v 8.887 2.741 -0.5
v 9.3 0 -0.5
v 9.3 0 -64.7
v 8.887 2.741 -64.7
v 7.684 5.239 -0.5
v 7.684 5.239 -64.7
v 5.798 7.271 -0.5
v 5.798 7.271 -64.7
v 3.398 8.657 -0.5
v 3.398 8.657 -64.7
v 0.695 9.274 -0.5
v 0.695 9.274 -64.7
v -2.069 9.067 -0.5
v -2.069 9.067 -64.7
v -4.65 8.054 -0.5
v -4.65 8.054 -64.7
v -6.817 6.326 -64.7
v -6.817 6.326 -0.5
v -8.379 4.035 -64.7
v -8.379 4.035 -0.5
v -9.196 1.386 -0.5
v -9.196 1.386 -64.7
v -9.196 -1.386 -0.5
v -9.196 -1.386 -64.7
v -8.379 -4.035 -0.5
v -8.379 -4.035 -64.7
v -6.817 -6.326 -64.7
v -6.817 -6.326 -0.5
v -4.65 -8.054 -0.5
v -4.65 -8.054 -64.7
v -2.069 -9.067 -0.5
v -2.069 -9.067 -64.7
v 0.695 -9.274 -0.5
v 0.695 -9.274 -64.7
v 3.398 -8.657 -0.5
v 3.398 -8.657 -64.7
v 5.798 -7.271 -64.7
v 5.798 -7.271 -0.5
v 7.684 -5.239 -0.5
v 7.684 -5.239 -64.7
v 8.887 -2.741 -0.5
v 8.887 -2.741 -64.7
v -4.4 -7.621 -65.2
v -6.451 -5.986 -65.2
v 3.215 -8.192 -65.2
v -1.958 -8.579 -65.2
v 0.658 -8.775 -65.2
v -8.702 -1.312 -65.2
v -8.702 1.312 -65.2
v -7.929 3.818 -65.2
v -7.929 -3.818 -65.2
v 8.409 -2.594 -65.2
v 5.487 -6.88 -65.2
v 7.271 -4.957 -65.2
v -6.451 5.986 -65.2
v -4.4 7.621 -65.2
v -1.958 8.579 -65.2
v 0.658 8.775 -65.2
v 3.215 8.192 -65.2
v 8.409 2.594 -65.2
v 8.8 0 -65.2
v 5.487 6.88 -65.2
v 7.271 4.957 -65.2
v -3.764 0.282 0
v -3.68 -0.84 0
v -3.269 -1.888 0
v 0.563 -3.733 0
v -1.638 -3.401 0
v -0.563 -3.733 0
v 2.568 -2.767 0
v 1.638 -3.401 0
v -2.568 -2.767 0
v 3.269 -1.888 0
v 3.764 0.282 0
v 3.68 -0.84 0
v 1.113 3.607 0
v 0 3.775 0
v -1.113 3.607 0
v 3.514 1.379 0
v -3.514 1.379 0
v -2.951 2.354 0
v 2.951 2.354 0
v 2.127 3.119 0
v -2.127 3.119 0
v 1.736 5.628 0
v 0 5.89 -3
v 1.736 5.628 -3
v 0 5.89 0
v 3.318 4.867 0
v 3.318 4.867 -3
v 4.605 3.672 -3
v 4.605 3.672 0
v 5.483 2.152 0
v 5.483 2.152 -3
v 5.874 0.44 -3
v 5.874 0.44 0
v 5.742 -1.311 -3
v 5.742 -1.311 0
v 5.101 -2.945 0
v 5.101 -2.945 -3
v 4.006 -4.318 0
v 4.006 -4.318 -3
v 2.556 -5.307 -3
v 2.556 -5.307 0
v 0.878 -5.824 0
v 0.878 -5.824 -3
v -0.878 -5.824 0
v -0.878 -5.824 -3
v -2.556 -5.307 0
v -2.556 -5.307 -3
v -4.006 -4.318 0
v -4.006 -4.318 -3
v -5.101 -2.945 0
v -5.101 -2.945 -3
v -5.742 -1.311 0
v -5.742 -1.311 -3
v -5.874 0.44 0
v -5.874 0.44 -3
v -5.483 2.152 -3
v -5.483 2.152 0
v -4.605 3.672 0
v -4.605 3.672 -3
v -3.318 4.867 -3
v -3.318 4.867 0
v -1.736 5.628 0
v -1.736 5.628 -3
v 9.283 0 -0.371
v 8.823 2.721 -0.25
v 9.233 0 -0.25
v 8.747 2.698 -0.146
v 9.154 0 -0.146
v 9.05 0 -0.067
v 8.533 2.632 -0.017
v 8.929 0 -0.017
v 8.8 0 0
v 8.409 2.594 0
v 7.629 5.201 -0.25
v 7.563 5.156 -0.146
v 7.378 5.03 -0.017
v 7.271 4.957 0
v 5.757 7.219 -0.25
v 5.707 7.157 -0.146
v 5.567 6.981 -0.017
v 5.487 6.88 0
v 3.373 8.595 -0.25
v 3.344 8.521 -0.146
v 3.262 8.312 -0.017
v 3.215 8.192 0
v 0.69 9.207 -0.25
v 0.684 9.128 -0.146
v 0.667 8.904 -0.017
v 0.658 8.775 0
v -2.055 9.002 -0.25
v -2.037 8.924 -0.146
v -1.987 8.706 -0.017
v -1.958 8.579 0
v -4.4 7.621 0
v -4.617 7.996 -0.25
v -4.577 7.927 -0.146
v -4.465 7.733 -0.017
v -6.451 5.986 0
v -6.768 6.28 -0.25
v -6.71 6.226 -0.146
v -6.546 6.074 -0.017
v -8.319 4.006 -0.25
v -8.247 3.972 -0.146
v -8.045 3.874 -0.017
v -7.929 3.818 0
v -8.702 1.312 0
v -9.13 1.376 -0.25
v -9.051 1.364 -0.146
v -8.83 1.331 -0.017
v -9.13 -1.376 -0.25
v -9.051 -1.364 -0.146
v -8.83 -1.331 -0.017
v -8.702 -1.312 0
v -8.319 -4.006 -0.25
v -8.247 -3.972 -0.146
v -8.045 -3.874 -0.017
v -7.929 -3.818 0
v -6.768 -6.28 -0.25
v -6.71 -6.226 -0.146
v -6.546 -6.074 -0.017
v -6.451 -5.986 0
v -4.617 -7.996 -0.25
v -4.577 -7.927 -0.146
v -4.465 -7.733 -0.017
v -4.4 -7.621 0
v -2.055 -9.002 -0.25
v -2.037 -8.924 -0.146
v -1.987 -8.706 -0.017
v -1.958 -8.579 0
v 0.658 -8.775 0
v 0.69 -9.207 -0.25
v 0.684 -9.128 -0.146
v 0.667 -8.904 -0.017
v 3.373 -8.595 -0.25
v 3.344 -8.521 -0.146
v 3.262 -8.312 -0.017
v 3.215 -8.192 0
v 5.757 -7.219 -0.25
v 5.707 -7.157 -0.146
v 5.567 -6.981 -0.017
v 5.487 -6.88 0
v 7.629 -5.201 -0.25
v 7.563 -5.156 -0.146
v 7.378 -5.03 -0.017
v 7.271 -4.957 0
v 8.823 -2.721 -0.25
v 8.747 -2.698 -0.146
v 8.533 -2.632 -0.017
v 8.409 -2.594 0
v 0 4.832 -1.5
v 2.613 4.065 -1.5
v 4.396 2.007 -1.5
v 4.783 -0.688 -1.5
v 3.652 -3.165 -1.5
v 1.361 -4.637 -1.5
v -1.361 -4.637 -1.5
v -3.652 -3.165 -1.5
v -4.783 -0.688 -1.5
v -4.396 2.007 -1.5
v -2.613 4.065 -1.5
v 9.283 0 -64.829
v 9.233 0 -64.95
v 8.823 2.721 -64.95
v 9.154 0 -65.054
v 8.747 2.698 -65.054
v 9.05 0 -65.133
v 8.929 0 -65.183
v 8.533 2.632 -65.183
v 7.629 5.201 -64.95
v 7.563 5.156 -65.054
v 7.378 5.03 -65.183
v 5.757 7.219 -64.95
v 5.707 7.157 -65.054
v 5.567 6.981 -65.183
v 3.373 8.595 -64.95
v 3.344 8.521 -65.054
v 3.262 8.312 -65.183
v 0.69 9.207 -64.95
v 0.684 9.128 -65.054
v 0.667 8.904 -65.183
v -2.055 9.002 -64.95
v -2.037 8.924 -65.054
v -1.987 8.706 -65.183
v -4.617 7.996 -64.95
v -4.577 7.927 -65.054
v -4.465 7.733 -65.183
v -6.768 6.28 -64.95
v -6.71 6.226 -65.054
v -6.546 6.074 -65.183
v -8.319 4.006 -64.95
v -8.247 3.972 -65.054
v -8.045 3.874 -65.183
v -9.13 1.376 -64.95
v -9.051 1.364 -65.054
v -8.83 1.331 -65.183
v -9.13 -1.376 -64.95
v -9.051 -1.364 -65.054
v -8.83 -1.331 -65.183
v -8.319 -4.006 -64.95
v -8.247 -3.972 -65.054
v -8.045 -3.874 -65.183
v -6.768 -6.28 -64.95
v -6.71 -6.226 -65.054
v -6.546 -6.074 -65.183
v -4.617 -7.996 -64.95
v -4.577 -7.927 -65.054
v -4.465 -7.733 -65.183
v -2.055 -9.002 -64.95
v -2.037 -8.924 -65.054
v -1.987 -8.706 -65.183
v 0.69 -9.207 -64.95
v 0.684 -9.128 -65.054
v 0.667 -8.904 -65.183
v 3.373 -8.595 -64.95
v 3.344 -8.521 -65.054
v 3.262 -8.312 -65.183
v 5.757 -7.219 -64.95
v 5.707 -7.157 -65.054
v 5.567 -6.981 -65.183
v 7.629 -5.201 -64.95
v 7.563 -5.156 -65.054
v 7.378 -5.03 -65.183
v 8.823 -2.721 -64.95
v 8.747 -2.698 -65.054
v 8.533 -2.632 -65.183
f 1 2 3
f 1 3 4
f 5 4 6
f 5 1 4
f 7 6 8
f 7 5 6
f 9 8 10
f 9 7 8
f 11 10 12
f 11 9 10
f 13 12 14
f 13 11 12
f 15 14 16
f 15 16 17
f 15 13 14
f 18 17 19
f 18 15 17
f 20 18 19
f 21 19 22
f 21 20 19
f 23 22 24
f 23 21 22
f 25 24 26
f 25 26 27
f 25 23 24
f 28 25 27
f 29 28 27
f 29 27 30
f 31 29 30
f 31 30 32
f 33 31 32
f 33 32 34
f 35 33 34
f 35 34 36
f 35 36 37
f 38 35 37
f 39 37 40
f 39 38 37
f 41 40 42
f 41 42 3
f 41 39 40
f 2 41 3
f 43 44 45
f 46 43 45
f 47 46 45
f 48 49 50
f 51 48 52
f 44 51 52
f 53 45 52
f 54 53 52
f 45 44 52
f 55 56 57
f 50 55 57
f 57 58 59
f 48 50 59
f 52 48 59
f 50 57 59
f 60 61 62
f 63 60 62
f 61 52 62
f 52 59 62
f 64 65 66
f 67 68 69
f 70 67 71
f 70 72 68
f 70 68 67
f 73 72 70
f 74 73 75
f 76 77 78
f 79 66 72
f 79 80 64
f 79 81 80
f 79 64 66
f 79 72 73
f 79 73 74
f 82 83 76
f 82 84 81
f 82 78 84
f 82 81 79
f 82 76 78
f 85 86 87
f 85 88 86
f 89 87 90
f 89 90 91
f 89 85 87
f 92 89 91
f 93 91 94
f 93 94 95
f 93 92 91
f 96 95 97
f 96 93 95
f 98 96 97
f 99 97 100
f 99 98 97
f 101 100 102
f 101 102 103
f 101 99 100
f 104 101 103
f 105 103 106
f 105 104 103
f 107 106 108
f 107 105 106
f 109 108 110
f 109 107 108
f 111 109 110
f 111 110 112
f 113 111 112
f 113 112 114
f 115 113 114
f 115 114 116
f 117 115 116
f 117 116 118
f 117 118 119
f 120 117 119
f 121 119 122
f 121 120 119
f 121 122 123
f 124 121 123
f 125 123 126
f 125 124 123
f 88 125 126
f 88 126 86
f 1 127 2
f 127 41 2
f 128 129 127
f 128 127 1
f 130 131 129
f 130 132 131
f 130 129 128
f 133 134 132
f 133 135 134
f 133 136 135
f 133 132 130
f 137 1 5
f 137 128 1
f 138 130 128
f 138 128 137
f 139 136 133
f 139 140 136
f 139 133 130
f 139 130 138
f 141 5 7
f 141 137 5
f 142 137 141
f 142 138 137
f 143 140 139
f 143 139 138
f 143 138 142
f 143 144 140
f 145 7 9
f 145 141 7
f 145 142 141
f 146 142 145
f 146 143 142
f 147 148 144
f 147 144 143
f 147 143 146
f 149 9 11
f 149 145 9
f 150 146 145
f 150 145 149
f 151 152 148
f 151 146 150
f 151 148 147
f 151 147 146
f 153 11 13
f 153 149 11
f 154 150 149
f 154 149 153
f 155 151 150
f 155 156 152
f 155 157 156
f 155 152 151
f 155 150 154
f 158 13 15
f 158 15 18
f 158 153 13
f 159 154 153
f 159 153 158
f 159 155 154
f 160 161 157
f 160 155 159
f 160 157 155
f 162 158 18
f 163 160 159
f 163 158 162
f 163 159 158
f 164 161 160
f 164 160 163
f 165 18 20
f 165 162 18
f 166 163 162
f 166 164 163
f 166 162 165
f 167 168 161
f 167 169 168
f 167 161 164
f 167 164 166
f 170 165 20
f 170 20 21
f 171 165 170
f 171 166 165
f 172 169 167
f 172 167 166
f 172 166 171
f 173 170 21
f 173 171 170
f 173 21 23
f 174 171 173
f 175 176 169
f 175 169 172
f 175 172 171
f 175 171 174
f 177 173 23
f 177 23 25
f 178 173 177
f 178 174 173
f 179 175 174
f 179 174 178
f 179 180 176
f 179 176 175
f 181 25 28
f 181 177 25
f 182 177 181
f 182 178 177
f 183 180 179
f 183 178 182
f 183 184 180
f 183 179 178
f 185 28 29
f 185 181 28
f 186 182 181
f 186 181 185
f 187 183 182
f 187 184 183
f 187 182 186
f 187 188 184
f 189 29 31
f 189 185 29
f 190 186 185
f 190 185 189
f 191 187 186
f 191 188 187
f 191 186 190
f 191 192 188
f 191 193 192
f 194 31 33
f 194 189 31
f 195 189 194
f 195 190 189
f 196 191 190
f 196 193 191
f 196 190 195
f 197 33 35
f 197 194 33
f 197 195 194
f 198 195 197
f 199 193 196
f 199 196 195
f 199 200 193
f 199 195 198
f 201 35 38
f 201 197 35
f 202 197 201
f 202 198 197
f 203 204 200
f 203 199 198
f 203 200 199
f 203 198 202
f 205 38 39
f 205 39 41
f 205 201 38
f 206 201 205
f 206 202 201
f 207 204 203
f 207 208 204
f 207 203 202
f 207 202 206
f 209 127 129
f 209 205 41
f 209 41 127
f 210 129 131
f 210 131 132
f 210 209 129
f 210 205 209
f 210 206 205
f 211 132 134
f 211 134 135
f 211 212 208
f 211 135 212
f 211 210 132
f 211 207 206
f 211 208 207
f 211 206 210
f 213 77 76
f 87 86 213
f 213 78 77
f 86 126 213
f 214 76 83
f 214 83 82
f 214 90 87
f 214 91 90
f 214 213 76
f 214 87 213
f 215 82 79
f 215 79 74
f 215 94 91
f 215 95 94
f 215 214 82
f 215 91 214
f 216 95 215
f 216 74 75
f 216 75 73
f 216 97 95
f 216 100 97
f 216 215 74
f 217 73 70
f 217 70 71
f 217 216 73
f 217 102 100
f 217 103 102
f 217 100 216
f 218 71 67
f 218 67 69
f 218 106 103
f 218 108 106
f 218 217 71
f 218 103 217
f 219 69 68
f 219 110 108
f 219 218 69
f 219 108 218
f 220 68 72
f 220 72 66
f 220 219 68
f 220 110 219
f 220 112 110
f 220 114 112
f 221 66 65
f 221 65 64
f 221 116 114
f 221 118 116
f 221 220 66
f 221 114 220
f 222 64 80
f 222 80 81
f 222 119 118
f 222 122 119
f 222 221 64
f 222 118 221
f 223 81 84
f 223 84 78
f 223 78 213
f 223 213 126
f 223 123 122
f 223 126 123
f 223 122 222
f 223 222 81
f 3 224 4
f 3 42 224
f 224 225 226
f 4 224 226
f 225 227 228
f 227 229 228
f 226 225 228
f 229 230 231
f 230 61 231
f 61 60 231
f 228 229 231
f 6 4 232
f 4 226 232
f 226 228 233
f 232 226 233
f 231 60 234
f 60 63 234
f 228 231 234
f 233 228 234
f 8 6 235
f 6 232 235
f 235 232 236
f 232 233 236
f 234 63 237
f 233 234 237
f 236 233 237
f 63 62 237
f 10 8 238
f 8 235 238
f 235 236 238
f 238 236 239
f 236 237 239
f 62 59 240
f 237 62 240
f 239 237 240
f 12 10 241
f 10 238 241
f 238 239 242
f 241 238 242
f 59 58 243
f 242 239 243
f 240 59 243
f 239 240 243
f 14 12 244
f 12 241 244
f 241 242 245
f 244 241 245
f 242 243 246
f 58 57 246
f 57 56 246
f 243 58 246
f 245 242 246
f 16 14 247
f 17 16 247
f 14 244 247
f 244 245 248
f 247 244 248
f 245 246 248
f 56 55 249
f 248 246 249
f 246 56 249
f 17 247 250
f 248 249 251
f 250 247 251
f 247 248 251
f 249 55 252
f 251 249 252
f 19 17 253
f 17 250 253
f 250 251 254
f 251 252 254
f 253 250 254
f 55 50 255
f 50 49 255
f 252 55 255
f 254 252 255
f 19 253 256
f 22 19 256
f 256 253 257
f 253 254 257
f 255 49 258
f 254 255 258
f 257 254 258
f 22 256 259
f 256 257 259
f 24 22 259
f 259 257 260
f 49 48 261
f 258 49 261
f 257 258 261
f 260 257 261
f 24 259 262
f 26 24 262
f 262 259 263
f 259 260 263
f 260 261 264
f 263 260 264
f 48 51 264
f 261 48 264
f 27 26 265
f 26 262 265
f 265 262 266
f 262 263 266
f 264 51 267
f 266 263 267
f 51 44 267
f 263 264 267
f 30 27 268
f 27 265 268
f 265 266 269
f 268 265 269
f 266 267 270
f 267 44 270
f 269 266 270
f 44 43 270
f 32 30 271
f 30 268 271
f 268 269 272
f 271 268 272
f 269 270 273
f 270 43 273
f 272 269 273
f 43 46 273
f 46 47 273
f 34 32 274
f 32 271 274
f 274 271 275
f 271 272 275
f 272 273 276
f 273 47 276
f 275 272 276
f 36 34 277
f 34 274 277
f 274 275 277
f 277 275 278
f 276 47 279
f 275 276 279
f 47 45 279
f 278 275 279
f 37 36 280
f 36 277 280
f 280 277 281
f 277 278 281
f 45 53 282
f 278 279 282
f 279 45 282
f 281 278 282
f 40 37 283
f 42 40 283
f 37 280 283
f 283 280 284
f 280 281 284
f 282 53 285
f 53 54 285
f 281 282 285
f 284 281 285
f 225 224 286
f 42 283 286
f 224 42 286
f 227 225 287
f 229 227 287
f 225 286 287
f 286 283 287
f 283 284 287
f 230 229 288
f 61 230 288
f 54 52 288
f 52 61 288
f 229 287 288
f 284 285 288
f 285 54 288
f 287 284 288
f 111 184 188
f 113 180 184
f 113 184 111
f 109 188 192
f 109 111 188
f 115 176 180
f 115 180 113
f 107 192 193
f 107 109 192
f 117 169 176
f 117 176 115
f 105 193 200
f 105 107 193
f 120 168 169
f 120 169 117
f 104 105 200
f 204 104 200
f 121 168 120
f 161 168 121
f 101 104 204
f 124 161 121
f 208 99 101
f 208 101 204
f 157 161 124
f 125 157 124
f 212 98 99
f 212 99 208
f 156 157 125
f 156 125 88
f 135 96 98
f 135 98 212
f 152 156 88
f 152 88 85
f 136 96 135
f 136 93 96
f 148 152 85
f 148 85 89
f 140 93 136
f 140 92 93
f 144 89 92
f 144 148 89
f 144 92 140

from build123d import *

# Parameters (mm, degrees)
SKETCH1_R           = 9.3
BOSS_EXTRUDE1_DEPTH = 65.2
FILLET1_R           = 0.5


with BuildPart() as part:
    # Sketch1 → Boss-Extrude1 (new body)
    with BuildSketch(Plane.XY):
        Circle(SKETCH1_R)
    extrude(amount=-BOSS_EXTRUDE1_DEPTH)

    # Sketch3 → Cut-Revolve1 (revolve, cut)
    with BuildSketch(Plane(origin=(0, 0, 0), x_dir=(0, 0, -1), z_dir=(1, 0, 0))):
        Polygon((0, 5.89), (0, 3.775), (3, 5.89), align=None)
    revolve(axis=Axis((0, 0, 55), (0, 0, -1)), mode=Mode.SUBTRACT)

    # Fillet1
    fillet1_edges = [part.edges().sort_by_distance(p)[0] for p in [
        (-9.3, 0, 0),
        (-9.3, 0, -65.2),
    ]]
    fillet(fillet1_edges, radius=FILLET1_R)


solid = part.part
